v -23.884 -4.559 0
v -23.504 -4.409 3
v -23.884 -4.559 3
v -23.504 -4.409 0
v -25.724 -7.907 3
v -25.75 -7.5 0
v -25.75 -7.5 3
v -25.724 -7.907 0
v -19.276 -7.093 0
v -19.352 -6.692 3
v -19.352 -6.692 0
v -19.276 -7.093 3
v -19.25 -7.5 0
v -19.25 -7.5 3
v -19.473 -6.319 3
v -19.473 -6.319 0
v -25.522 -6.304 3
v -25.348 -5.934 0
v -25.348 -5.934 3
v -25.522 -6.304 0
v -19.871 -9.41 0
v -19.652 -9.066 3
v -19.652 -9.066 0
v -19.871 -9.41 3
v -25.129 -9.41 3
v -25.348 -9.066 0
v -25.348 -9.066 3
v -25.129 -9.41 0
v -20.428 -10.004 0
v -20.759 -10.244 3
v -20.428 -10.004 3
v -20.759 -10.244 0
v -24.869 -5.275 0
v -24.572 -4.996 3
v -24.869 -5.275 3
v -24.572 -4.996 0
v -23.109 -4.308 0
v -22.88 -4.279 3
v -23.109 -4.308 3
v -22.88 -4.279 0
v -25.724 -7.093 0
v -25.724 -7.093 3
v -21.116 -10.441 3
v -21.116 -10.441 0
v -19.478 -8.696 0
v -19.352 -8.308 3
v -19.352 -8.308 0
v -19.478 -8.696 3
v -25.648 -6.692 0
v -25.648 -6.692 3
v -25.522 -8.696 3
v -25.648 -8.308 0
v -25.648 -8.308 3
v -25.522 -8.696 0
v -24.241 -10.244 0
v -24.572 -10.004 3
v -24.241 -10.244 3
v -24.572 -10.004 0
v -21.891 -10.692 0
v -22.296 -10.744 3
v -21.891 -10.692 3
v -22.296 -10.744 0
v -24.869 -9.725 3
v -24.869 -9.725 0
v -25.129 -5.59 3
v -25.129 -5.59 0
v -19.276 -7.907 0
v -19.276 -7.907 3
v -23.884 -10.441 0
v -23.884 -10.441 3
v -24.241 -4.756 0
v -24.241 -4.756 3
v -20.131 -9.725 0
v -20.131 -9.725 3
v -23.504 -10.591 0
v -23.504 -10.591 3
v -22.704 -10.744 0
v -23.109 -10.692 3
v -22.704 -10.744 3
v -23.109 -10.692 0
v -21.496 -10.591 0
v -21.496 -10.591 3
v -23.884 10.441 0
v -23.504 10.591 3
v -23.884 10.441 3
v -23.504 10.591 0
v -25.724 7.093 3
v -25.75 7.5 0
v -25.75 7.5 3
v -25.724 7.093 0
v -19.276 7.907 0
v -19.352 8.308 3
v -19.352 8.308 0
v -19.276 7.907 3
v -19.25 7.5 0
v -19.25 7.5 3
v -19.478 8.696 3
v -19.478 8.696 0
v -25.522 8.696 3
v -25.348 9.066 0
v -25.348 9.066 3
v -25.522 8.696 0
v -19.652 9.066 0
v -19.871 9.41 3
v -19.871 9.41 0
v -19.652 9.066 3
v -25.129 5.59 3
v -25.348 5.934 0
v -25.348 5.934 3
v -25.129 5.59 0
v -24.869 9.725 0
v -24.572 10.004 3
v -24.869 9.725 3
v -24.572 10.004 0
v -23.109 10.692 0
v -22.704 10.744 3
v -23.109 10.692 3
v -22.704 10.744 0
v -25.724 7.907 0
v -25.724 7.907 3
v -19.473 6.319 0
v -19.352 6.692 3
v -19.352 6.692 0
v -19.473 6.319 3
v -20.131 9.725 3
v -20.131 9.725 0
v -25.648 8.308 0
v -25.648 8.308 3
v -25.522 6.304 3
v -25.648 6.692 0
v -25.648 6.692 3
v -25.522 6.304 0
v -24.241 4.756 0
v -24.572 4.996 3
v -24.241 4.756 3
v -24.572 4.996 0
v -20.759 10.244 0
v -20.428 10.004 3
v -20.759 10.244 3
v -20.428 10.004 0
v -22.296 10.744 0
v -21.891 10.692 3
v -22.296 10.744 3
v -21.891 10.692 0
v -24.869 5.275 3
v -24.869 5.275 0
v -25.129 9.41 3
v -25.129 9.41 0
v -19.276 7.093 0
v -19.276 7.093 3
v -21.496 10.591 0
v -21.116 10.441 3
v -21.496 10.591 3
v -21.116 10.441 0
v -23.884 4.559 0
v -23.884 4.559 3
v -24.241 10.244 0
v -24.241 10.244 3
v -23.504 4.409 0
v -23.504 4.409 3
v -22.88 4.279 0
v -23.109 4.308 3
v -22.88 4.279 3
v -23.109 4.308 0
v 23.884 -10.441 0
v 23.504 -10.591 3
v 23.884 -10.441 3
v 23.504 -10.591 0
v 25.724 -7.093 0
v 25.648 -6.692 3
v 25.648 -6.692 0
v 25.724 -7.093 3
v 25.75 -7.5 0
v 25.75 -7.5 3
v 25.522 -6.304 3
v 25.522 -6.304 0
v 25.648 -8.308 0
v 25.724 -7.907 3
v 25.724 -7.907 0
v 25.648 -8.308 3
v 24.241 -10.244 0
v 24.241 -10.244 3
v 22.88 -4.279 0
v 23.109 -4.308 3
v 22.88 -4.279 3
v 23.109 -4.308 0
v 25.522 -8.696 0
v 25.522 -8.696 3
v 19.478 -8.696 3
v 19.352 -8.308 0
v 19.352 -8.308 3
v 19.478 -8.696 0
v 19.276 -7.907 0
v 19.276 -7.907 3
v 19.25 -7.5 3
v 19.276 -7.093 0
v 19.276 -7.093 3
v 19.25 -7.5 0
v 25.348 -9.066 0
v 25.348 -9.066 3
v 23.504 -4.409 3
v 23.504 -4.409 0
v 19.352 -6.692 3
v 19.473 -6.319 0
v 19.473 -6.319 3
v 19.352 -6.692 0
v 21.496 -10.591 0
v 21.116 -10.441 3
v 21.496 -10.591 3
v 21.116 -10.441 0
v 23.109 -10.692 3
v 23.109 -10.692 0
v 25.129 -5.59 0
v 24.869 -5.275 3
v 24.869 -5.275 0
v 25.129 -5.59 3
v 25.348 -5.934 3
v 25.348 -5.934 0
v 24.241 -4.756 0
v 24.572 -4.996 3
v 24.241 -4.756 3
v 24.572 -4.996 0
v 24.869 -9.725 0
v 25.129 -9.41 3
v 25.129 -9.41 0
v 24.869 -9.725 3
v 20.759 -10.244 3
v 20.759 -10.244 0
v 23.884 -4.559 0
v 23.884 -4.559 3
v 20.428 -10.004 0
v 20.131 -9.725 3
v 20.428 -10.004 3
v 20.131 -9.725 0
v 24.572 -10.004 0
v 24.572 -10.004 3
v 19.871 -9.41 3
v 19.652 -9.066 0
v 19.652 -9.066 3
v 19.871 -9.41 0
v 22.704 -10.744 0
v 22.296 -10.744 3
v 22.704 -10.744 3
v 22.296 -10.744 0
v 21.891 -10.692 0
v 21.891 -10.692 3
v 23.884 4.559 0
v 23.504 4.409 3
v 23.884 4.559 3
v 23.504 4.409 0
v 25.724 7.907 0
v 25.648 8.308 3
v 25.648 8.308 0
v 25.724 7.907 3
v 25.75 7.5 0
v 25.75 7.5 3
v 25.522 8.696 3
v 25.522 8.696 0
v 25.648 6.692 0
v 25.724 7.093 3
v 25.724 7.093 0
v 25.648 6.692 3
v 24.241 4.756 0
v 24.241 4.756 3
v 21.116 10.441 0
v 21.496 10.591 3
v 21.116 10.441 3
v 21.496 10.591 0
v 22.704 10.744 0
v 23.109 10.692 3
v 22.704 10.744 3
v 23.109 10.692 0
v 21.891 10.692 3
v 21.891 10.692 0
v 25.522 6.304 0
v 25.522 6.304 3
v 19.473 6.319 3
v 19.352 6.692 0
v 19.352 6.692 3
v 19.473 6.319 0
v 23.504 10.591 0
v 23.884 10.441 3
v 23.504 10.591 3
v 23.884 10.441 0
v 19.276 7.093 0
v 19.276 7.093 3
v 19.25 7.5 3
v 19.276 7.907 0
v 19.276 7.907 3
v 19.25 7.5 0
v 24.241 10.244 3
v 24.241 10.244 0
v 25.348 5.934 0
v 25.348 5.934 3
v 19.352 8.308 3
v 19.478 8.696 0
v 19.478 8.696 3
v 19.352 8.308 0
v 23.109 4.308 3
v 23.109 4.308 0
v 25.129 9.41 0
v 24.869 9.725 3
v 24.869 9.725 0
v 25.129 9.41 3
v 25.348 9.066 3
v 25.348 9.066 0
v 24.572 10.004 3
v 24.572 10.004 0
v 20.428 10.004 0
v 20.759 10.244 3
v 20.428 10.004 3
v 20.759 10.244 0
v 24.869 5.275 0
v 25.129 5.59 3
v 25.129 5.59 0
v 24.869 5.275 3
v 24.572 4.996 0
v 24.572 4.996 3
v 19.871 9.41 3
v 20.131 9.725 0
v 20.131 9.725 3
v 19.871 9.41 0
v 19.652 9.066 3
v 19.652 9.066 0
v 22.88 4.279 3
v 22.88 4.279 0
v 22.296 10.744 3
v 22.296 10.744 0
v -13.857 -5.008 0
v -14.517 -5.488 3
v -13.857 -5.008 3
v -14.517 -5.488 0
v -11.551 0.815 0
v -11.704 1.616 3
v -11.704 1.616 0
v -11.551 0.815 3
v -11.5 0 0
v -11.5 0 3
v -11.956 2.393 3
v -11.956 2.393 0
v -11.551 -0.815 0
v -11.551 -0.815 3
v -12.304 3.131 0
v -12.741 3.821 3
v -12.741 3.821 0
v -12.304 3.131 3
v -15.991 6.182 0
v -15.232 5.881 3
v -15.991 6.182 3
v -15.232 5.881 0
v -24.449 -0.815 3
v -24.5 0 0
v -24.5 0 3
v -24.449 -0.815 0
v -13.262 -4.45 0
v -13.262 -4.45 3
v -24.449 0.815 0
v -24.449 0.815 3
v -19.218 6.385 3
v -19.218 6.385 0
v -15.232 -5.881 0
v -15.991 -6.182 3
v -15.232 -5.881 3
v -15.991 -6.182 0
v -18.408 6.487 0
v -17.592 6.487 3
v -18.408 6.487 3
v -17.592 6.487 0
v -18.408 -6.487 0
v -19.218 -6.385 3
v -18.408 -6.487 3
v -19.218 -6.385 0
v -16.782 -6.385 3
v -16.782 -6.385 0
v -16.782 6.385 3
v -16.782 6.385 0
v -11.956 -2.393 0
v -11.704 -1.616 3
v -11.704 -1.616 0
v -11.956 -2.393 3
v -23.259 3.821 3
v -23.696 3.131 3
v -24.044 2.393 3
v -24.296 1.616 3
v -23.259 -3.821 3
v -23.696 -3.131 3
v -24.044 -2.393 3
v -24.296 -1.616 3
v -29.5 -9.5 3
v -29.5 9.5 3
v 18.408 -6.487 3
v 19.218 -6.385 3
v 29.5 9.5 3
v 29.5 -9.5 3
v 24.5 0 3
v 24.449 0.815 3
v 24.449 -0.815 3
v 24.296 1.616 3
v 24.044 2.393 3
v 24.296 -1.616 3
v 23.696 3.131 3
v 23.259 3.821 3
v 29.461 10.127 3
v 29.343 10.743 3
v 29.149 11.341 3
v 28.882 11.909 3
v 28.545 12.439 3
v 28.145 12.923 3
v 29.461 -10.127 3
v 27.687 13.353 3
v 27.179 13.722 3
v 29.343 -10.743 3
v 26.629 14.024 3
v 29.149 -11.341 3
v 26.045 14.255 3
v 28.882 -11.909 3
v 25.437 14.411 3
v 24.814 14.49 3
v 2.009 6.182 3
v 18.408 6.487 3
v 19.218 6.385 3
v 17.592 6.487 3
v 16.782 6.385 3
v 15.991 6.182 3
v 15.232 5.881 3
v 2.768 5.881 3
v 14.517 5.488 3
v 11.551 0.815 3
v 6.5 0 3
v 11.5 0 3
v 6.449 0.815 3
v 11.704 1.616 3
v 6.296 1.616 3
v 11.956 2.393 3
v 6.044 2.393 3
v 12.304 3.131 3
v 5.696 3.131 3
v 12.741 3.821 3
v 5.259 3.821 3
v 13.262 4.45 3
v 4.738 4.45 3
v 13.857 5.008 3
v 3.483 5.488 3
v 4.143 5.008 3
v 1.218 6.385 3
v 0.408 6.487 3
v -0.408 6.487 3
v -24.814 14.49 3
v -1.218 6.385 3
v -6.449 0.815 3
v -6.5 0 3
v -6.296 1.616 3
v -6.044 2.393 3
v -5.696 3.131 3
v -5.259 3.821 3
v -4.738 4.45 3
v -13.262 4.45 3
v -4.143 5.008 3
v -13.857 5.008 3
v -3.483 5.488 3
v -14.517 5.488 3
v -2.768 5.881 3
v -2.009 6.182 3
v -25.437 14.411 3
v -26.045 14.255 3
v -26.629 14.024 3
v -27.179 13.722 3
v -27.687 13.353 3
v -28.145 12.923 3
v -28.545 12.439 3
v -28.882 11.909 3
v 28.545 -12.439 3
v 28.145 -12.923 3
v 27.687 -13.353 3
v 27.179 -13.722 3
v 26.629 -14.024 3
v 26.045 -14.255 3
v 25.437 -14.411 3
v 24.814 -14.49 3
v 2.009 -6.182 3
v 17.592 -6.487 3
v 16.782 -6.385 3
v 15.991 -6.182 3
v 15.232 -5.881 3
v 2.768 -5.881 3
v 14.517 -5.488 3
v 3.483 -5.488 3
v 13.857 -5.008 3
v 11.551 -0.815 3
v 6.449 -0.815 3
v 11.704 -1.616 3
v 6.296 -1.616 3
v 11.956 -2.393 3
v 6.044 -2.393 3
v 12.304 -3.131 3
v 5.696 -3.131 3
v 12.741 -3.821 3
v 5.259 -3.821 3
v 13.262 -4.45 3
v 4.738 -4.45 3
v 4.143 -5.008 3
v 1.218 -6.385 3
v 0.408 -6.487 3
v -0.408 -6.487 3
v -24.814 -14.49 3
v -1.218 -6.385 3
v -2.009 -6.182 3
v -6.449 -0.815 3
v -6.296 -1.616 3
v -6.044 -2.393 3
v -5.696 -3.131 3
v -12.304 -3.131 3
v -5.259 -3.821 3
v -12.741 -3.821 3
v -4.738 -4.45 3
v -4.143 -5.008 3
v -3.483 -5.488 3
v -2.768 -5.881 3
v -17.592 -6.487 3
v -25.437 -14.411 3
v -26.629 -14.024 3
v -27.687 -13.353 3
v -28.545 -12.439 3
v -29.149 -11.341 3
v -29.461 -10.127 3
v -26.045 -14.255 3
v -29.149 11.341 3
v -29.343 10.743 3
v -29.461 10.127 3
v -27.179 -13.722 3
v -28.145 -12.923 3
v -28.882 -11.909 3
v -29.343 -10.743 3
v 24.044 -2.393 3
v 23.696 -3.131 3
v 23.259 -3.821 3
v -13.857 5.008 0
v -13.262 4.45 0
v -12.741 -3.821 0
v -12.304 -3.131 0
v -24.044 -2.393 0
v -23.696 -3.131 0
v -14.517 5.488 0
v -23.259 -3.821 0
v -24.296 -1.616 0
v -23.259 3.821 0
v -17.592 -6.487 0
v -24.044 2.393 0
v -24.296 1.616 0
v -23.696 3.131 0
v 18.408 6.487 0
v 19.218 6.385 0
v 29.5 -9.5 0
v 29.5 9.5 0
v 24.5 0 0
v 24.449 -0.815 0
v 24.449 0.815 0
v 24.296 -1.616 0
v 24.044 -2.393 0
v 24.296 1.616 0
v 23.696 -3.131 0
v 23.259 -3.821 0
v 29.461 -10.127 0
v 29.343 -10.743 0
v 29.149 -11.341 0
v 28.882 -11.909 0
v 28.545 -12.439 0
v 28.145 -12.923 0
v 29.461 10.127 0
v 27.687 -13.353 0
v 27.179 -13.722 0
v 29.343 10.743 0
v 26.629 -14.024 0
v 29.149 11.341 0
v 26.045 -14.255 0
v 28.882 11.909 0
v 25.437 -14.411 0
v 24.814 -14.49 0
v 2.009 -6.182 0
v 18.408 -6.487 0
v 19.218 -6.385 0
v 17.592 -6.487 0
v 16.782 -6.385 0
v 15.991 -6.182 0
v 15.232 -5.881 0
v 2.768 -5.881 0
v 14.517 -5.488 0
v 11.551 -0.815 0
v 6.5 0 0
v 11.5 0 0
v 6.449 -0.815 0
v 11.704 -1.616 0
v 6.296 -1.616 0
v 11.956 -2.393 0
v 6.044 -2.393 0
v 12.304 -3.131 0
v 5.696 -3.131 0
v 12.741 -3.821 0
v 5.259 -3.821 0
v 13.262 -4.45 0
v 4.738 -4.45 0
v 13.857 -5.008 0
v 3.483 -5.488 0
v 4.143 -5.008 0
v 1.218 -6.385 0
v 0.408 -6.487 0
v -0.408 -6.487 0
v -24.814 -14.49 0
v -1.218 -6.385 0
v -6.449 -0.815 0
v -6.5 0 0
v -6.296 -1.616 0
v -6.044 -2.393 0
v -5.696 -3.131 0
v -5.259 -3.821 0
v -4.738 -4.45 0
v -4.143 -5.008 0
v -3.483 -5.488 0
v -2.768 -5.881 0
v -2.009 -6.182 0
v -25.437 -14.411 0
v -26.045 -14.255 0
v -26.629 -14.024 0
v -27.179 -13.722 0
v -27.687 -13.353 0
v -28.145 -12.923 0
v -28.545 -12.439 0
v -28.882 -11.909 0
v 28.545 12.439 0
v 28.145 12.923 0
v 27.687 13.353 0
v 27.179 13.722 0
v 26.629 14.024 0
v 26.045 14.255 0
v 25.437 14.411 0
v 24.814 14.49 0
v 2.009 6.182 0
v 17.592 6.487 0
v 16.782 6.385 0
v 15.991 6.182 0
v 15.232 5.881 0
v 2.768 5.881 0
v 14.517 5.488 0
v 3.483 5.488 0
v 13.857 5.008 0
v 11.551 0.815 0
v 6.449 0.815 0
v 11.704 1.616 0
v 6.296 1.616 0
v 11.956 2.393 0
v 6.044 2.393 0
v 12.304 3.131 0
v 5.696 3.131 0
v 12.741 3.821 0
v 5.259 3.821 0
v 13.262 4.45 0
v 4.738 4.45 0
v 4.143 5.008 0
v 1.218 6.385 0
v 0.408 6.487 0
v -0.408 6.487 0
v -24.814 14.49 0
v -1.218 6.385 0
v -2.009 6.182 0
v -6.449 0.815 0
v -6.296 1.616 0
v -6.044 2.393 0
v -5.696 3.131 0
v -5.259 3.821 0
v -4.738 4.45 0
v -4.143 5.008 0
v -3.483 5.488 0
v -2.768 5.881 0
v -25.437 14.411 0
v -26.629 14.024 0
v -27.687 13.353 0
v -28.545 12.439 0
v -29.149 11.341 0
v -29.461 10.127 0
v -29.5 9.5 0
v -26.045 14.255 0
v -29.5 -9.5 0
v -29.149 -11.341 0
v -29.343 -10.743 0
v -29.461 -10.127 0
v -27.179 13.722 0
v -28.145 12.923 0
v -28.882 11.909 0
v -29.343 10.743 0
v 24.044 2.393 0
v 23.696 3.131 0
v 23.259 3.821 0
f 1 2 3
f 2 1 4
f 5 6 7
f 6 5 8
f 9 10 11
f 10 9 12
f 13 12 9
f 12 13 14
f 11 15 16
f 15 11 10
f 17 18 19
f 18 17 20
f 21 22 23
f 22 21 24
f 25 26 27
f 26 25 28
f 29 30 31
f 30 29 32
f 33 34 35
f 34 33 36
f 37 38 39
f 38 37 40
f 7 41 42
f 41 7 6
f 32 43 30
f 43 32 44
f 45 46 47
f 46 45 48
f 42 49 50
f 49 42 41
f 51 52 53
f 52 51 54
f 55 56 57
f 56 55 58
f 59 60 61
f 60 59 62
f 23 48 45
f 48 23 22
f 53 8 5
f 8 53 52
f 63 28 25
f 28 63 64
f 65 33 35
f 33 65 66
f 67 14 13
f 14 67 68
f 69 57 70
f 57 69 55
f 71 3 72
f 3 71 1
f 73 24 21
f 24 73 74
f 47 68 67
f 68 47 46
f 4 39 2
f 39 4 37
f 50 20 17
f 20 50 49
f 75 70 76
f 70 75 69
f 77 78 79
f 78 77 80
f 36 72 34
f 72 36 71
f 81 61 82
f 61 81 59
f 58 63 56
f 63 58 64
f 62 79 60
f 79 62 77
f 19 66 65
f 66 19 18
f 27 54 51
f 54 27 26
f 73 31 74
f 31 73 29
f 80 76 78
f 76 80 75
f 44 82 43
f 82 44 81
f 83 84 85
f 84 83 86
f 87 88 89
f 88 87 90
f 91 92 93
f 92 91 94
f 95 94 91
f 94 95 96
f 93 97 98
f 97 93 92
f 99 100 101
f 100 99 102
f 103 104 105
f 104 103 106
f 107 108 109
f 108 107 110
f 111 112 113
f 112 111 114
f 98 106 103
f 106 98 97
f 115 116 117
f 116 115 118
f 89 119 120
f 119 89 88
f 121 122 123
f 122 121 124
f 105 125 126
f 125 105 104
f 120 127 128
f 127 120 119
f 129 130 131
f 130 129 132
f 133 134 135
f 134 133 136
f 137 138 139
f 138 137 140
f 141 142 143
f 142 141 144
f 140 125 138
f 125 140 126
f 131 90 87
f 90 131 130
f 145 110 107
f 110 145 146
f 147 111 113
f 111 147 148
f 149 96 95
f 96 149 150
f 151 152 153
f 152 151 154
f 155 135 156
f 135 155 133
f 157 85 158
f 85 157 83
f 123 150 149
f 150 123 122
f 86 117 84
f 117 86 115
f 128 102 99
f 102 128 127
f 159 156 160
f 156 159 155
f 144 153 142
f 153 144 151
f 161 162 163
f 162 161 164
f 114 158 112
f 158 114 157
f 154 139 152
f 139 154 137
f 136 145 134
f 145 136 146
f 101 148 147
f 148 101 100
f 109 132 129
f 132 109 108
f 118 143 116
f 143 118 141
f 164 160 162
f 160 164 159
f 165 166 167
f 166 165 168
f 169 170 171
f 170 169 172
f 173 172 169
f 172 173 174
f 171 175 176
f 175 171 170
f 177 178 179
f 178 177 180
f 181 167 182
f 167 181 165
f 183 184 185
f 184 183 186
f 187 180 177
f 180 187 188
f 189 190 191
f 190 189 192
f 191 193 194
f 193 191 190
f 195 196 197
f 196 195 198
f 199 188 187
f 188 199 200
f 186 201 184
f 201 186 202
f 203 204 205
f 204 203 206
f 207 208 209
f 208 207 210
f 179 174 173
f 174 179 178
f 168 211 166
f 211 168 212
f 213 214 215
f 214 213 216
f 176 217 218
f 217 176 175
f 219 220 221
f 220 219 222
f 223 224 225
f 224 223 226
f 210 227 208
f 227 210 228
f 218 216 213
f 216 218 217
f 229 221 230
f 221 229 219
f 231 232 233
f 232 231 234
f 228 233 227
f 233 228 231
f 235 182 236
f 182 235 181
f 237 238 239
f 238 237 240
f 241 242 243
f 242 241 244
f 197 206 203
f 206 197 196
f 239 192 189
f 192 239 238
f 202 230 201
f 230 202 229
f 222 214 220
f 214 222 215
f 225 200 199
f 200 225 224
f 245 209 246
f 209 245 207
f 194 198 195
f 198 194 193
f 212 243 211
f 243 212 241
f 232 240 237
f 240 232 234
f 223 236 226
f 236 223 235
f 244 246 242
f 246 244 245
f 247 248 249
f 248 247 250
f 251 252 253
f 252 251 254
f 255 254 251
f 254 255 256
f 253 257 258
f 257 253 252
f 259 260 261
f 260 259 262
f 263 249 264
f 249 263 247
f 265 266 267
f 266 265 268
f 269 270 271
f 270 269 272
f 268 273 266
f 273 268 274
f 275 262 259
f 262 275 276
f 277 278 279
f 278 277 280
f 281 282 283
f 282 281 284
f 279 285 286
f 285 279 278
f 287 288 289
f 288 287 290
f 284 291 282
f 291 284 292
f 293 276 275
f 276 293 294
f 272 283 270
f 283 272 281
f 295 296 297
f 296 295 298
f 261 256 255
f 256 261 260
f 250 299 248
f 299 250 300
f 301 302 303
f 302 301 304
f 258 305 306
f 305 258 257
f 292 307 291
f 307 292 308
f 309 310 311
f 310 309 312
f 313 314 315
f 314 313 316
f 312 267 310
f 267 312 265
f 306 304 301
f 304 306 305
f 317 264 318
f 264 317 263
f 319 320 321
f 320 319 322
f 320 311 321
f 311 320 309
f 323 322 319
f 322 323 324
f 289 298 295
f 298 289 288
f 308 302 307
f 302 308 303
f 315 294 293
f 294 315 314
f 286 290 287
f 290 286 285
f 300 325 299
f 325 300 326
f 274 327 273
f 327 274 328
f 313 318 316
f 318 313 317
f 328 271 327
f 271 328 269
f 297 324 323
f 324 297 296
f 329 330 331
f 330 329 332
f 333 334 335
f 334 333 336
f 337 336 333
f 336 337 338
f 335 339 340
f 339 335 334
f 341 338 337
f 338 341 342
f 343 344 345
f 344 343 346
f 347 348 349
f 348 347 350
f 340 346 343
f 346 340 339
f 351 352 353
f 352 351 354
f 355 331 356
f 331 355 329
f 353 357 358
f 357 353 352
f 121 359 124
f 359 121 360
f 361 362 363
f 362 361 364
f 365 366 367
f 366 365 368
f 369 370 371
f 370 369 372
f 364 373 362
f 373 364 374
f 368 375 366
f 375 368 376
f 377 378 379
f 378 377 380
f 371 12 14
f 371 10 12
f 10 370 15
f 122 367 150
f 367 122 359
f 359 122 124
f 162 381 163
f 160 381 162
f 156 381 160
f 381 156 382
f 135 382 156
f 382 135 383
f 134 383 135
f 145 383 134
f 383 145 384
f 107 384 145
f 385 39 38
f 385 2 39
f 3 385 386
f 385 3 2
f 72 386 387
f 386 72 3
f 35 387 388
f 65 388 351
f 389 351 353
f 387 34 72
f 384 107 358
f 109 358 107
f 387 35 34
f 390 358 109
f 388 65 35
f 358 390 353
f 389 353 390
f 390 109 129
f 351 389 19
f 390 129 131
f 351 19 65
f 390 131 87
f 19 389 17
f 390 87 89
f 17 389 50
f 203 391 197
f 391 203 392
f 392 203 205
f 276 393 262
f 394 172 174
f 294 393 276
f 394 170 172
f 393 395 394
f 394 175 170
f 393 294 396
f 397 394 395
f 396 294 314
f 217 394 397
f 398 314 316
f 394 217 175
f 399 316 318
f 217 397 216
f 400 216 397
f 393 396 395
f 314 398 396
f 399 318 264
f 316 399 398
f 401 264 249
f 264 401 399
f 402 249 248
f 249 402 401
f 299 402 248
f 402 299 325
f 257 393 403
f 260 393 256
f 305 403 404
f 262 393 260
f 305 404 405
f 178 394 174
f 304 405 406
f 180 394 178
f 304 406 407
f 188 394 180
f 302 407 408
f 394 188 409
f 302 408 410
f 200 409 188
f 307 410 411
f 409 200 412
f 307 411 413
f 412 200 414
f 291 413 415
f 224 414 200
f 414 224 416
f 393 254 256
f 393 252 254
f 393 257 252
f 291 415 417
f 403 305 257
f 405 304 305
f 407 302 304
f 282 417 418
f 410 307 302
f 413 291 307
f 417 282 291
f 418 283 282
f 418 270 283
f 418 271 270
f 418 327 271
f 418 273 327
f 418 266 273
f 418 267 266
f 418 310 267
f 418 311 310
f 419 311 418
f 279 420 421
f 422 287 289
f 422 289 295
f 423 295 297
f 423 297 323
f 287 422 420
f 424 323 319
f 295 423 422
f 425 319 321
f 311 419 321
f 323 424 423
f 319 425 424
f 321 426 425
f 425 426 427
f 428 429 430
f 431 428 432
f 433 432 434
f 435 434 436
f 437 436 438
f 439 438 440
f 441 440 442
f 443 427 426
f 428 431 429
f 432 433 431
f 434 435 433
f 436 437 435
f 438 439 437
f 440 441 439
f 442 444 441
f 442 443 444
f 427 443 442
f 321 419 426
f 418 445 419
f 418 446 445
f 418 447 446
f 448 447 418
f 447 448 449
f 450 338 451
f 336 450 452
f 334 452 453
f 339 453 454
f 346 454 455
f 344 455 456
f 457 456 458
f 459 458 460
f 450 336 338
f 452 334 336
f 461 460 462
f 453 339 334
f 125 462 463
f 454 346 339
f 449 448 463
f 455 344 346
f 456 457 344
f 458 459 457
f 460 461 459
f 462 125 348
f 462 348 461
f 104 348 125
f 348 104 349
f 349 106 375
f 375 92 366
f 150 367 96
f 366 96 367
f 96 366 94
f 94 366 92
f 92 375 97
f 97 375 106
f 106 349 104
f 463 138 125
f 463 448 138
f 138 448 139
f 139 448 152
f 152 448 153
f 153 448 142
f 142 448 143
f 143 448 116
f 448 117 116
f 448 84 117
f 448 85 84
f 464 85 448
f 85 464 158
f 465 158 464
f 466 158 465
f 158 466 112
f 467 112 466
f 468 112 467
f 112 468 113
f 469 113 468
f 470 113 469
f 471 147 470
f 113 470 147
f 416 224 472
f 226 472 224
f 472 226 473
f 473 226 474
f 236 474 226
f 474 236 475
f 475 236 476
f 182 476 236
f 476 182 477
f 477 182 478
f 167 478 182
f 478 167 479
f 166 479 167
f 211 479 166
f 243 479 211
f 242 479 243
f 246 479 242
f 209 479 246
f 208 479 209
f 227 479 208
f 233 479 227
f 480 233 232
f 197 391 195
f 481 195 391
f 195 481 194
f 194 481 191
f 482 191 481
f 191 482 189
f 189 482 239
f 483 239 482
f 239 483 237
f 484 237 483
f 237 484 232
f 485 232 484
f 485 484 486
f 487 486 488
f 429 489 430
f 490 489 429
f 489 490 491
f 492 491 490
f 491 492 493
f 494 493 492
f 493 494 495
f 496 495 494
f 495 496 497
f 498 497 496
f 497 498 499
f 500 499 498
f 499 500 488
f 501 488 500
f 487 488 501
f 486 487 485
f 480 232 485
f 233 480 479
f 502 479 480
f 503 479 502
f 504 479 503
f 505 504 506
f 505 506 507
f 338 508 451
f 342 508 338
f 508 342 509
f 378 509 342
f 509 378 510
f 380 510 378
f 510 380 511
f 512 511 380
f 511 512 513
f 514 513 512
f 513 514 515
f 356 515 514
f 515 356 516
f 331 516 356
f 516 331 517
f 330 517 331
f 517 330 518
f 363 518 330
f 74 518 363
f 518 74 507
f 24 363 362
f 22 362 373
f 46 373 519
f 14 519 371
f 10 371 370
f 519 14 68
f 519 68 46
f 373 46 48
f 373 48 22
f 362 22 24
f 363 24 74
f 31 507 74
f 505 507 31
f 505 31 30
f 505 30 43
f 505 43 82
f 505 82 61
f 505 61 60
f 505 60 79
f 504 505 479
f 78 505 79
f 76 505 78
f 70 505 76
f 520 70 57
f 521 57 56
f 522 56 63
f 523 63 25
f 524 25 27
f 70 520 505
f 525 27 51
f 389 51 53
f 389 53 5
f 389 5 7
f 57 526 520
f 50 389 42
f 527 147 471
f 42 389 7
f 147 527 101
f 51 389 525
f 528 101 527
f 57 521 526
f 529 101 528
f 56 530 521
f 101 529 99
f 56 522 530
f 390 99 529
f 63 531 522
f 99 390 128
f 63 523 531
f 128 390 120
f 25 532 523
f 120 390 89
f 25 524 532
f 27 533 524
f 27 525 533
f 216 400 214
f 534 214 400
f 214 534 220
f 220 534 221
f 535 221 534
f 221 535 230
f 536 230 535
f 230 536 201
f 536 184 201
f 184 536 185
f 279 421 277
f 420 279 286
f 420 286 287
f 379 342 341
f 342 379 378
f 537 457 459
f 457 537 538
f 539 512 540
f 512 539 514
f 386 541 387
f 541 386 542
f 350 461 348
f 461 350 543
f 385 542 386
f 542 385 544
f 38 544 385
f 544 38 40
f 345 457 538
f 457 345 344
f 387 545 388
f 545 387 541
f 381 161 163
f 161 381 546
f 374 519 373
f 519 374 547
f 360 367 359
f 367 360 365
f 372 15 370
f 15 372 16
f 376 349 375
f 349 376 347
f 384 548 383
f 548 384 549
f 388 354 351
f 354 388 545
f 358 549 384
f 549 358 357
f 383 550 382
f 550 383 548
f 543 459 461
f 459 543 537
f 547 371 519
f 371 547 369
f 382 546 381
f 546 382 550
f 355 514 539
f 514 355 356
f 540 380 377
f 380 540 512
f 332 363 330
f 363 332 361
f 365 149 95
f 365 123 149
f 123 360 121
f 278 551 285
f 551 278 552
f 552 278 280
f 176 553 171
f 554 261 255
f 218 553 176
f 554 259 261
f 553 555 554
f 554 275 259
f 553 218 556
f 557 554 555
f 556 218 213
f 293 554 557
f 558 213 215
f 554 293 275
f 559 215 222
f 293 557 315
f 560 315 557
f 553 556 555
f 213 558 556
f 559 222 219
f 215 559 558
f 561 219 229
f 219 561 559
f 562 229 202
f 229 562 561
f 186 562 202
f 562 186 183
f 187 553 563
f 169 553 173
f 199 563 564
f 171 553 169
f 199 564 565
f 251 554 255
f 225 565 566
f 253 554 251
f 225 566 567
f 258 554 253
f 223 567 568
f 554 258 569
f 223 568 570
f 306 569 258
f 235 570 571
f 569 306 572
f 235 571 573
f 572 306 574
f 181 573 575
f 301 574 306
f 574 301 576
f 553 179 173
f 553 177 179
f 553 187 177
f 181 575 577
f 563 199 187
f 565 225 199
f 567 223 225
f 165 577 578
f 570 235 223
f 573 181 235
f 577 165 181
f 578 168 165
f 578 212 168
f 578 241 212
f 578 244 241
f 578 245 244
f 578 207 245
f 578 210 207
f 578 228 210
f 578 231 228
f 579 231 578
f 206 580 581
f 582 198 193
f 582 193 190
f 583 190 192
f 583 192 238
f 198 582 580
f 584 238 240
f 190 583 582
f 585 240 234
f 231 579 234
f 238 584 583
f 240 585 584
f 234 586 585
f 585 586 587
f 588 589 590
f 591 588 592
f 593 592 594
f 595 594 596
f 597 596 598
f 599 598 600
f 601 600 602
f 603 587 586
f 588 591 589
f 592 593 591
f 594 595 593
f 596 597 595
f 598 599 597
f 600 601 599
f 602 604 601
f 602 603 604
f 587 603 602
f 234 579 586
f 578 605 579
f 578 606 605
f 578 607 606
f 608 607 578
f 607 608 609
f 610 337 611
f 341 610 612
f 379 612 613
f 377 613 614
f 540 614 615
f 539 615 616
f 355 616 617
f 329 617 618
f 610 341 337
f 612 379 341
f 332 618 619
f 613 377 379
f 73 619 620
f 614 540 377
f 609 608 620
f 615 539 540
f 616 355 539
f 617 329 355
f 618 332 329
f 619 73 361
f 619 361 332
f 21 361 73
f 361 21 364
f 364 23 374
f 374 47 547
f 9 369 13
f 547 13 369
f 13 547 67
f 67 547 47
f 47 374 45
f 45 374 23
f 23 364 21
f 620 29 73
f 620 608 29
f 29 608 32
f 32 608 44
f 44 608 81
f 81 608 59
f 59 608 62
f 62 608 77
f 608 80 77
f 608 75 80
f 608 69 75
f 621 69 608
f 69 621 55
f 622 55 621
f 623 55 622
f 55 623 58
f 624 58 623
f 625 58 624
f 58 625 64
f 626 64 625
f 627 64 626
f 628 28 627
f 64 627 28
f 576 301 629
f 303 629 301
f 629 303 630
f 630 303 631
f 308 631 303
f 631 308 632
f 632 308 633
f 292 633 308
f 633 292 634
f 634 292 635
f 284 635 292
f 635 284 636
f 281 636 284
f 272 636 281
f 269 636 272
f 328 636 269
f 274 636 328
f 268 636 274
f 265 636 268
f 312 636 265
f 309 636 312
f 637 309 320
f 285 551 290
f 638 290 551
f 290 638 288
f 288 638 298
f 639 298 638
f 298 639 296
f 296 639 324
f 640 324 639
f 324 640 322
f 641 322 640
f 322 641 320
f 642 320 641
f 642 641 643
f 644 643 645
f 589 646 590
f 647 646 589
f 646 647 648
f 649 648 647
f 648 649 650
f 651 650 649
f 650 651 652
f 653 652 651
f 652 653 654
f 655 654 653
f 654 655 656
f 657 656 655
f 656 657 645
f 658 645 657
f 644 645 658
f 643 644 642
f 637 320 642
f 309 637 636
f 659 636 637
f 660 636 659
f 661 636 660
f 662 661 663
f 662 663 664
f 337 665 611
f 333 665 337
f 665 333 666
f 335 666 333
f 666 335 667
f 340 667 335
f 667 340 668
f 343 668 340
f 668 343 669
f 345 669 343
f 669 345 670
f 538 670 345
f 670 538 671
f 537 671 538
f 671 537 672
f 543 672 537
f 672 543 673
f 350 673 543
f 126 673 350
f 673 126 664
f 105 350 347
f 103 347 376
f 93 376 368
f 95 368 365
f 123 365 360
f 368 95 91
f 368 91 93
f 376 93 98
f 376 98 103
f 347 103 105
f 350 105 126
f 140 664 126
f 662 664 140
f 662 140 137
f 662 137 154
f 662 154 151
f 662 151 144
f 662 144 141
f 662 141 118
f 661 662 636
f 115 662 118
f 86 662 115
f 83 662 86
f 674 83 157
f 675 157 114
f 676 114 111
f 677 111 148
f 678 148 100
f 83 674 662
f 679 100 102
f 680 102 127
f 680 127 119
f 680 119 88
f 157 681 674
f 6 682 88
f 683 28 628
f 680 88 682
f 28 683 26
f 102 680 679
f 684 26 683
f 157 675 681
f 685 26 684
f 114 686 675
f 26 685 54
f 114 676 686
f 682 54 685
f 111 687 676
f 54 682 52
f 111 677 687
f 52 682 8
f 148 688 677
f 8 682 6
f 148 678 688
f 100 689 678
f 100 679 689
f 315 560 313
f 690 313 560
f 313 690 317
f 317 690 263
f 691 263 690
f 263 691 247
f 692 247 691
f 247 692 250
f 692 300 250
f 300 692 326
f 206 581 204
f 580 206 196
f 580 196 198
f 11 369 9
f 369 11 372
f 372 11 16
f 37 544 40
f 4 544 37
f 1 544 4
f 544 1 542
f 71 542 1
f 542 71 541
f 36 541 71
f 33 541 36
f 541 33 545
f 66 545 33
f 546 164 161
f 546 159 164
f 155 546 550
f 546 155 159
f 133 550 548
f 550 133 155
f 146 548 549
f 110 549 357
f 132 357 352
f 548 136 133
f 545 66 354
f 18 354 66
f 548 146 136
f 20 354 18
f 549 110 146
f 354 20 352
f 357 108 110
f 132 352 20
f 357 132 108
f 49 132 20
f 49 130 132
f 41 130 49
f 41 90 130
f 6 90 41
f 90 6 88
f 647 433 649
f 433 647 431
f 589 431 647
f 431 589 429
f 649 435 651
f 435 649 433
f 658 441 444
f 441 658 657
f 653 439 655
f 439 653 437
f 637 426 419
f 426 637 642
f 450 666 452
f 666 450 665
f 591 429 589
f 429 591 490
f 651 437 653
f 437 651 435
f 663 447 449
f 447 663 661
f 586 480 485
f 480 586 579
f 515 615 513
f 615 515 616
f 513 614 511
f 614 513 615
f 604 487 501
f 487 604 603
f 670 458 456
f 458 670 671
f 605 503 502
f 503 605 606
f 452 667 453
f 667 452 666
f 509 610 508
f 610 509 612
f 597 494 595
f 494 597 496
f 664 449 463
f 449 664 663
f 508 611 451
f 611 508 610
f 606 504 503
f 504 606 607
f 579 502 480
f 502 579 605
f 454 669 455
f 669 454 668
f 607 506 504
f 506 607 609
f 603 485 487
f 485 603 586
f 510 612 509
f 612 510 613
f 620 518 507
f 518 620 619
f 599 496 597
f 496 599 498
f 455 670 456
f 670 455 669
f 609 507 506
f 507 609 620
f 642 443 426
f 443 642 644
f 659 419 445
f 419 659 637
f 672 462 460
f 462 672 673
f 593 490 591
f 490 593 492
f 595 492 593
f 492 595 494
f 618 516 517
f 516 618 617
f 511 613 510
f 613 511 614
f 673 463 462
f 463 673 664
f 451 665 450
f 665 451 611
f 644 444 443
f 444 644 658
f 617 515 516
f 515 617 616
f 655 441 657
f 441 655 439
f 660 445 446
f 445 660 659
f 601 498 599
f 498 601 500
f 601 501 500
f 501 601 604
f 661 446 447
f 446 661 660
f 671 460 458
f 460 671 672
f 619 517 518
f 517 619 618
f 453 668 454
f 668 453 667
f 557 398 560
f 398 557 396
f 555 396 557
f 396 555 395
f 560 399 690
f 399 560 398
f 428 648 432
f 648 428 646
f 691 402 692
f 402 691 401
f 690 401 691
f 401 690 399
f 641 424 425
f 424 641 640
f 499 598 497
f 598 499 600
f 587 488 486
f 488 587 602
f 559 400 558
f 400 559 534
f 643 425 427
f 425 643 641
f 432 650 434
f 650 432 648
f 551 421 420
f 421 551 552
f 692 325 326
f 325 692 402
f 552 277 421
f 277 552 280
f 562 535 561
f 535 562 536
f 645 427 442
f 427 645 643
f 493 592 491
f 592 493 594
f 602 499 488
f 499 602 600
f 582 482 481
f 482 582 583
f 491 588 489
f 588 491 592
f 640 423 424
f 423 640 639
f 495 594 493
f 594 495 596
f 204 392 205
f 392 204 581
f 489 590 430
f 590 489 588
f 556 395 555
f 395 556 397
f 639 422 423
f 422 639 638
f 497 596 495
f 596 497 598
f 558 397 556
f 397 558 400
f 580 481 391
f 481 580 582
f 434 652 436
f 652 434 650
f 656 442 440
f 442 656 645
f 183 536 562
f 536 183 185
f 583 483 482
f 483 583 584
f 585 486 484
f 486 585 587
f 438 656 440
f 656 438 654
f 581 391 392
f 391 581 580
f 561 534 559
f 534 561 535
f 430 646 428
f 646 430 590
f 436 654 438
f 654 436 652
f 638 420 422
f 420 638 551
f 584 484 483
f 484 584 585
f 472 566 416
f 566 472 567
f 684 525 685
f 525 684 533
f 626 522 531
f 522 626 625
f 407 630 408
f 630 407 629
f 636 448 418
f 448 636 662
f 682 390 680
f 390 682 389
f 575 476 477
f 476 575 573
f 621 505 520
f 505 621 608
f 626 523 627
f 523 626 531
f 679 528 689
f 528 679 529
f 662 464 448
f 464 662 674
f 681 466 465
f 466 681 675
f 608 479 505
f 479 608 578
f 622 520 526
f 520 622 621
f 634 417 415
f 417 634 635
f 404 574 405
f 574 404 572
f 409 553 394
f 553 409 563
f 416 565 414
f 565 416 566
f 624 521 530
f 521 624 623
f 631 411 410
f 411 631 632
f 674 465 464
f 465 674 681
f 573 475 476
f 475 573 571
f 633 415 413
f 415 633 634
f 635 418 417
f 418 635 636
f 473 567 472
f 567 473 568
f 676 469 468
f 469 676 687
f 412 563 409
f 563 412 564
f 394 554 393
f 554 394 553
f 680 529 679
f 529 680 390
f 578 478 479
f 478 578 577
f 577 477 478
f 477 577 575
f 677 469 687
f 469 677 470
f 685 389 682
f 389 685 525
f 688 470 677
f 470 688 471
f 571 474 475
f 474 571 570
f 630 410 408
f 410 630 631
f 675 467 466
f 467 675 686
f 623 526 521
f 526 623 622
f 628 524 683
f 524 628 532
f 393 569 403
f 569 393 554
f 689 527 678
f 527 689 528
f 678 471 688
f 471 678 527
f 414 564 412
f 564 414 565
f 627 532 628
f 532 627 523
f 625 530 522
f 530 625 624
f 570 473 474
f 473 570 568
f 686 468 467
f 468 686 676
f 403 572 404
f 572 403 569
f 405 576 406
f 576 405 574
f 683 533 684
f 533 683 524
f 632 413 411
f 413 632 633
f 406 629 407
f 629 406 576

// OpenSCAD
$fn = 50;

difference() {
	union() {
		hull() {
			translate(v = [-24.5, 9.5, 0]) {
				cylinder(h = 3, r = 5);
			}
			translate(v = [24.5, 9.5, 0]) {
				cylinder(h = 3, r = 5);
			}
			translate(v = [-24.5, -9.5, 0]) {
				cylinder(h = 3, r = 5);
			}
			translate(v = [24.5, -9.5, 0]) {
				cylinder(h = 3, r = 5);
			}
		}
	}
	union() {
		translate(v = [-22.5, -7.5, -100.0]) {
			cylinder(h = 200, r = 3.25);
		}
		translate(v = [-22.5, 7.5, -100.0]) {
			cylinder(h = 200, r = 3.25);
		}
		translate(v = [22.5, -7.5, -100.0]) {
			cylinder(h = 200, r = 3.25);
		}
		translate(v = [22.5, 7.5, -100.0]) {
			cylinder(h = 200, r = 3.25);
		}
		translate(v = [-22.5, -7.5, -100.0]) {
			cylinder(h = 200, r = 1.8);
		}
		translate(v = [-22.5, 7.5, -100.0]) {
			cylinder(h = 200, r = 1.8);
		}
		translate(v = [22.5, -7.5, -100.0]) {
			cylinder(h = 200, r = 1.8);
		}
		translate(v = [22.5, 7.5, -100.0]) {
			cylinder(h = 200, r = 1.8);
		}
		translate(v = [-18.0, 0, 0.0]) {
			cylinder(h = 3, r = 6.5);
		}
		cylinder(h = 3, r = 6.5);
		translate(v = [18.0, 0, 0.0]) {
			cylinder(h = 3, r = 6.5);
		}
	}
}
